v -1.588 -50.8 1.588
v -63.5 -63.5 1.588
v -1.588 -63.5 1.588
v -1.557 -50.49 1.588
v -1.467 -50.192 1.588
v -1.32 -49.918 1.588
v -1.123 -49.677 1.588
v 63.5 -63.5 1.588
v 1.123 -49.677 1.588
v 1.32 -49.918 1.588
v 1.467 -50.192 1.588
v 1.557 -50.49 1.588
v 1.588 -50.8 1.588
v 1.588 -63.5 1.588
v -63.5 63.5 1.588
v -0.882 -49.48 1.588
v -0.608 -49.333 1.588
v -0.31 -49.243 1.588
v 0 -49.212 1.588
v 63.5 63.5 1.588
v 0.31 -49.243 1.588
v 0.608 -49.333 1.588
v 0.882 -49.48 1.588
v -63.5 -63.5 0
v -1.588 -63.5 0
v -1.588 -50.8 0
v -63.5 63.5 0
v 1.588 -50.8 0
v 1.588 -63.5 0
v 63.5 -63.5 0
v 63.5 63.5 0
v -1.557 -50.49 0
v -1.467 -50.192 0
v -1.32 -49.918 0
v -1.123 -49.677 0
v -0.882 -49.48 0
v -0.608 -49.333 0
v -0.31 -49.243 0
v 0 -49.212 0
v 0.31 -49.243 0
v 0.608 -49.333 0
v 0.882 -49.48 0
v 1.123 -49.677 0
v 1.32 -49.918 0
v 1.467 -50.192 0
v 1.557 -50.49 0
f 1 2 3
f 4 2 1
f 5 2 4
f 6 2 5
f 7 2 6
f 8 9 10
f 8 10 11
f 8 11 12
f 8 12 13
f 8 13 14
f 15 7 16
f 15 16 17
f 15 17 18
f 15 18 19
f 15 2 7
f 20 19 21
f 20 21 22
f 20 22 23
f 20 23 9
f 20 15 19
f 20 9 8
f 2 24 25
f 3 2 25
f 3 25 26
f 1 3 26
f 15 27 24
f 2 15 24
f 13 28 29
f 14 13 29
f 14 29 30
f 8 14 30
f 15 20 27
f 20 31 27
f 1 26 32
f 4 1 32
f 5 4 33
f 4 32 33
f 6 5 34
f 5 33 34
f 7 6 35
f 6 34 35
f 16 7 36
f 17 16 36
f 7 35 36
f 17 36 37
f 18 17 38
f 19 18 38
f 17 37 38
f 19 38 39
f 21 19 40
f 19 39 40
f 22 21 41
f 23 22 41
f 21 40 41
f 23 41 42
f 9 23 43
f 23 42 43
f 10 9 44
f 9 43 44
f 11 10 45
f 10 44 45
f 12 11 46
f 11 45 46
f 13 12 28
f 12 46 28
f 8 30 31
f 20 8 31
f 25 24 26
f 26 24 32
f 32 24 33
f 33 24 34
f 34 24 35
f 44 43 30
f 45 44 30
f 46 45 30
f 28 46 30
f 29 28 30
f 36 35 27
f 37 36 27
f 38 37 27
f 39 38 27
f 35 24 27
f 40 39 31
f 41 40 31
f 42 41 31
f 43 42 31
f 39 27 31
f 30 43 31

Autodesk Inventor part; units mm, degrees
ref_plane "YZ Plane" through (0, 0, 0) normal (1, 0, 0) x (0, 1, 0)
ref_plane "XZ Plane" through (0, 0, 0) normal (0, 1, 0) x (-1, 0, 0)
ref_plane "XY Plane" through (0, 0, 0) normal (0, 0, 1) x (1, 0, 0)
sketch "Sketch1" plane through (0, 0, 0) normal (0, 0, 1) x (1, 0, 0)
  line L0 (-63.5, -63.5) -> (63.5, -63.5)
  line L1 (63.5, -63.5) -> (63.5, 63.5)
  line L2 (63.5, 63.5) -> (-63.5, 63.5)
  line L3 (-63.5, 63.5) -> (-63.5, -63.5)
  line L4 (-63.5, -63.5) -> (63.5, 63.5) construction
  line L5 (63.5, -63.5) -> (-63.5, 63.5) construction
  point P0 (0, 0)
  dimension "d0" = 127
  dimension "d1" = 127
extrude "Extrusion1" add sketch "Sketch1" along normal blind 1.5875
sketch "Sketch2" plane through (0, 0, 0) normal (0, 0, -1) x (-1, 0, 0)
  line L0 (0, -76.2) -> (0, -50.8) construction
  line L1 (63.5, -63.5) -> (-63.5, -63.5) projected
  line L2 (1.5875, -76.2) -> (1.5875, -50.8)
  line L3 (-1.5875, -50.8) -> (-1.5875, -76.2)
  arc A0 (-1.5875, -76.2) -> (1.5875, -76.2) centre (0, -76.2) ccw
  arc A1 (1.5875, -50.8) -> (-1.5875, -50.8) centre (0, -50.8) ccw
  point P0 (0, 0)
  point P1 (0, -63.5)
  dimension "d4" = 12.7
  dimension "d5" = 3.175
extrude "Extrusion2" cut sketch "Sketch2" against normal blind 1.5875
properties part number "mask template"
